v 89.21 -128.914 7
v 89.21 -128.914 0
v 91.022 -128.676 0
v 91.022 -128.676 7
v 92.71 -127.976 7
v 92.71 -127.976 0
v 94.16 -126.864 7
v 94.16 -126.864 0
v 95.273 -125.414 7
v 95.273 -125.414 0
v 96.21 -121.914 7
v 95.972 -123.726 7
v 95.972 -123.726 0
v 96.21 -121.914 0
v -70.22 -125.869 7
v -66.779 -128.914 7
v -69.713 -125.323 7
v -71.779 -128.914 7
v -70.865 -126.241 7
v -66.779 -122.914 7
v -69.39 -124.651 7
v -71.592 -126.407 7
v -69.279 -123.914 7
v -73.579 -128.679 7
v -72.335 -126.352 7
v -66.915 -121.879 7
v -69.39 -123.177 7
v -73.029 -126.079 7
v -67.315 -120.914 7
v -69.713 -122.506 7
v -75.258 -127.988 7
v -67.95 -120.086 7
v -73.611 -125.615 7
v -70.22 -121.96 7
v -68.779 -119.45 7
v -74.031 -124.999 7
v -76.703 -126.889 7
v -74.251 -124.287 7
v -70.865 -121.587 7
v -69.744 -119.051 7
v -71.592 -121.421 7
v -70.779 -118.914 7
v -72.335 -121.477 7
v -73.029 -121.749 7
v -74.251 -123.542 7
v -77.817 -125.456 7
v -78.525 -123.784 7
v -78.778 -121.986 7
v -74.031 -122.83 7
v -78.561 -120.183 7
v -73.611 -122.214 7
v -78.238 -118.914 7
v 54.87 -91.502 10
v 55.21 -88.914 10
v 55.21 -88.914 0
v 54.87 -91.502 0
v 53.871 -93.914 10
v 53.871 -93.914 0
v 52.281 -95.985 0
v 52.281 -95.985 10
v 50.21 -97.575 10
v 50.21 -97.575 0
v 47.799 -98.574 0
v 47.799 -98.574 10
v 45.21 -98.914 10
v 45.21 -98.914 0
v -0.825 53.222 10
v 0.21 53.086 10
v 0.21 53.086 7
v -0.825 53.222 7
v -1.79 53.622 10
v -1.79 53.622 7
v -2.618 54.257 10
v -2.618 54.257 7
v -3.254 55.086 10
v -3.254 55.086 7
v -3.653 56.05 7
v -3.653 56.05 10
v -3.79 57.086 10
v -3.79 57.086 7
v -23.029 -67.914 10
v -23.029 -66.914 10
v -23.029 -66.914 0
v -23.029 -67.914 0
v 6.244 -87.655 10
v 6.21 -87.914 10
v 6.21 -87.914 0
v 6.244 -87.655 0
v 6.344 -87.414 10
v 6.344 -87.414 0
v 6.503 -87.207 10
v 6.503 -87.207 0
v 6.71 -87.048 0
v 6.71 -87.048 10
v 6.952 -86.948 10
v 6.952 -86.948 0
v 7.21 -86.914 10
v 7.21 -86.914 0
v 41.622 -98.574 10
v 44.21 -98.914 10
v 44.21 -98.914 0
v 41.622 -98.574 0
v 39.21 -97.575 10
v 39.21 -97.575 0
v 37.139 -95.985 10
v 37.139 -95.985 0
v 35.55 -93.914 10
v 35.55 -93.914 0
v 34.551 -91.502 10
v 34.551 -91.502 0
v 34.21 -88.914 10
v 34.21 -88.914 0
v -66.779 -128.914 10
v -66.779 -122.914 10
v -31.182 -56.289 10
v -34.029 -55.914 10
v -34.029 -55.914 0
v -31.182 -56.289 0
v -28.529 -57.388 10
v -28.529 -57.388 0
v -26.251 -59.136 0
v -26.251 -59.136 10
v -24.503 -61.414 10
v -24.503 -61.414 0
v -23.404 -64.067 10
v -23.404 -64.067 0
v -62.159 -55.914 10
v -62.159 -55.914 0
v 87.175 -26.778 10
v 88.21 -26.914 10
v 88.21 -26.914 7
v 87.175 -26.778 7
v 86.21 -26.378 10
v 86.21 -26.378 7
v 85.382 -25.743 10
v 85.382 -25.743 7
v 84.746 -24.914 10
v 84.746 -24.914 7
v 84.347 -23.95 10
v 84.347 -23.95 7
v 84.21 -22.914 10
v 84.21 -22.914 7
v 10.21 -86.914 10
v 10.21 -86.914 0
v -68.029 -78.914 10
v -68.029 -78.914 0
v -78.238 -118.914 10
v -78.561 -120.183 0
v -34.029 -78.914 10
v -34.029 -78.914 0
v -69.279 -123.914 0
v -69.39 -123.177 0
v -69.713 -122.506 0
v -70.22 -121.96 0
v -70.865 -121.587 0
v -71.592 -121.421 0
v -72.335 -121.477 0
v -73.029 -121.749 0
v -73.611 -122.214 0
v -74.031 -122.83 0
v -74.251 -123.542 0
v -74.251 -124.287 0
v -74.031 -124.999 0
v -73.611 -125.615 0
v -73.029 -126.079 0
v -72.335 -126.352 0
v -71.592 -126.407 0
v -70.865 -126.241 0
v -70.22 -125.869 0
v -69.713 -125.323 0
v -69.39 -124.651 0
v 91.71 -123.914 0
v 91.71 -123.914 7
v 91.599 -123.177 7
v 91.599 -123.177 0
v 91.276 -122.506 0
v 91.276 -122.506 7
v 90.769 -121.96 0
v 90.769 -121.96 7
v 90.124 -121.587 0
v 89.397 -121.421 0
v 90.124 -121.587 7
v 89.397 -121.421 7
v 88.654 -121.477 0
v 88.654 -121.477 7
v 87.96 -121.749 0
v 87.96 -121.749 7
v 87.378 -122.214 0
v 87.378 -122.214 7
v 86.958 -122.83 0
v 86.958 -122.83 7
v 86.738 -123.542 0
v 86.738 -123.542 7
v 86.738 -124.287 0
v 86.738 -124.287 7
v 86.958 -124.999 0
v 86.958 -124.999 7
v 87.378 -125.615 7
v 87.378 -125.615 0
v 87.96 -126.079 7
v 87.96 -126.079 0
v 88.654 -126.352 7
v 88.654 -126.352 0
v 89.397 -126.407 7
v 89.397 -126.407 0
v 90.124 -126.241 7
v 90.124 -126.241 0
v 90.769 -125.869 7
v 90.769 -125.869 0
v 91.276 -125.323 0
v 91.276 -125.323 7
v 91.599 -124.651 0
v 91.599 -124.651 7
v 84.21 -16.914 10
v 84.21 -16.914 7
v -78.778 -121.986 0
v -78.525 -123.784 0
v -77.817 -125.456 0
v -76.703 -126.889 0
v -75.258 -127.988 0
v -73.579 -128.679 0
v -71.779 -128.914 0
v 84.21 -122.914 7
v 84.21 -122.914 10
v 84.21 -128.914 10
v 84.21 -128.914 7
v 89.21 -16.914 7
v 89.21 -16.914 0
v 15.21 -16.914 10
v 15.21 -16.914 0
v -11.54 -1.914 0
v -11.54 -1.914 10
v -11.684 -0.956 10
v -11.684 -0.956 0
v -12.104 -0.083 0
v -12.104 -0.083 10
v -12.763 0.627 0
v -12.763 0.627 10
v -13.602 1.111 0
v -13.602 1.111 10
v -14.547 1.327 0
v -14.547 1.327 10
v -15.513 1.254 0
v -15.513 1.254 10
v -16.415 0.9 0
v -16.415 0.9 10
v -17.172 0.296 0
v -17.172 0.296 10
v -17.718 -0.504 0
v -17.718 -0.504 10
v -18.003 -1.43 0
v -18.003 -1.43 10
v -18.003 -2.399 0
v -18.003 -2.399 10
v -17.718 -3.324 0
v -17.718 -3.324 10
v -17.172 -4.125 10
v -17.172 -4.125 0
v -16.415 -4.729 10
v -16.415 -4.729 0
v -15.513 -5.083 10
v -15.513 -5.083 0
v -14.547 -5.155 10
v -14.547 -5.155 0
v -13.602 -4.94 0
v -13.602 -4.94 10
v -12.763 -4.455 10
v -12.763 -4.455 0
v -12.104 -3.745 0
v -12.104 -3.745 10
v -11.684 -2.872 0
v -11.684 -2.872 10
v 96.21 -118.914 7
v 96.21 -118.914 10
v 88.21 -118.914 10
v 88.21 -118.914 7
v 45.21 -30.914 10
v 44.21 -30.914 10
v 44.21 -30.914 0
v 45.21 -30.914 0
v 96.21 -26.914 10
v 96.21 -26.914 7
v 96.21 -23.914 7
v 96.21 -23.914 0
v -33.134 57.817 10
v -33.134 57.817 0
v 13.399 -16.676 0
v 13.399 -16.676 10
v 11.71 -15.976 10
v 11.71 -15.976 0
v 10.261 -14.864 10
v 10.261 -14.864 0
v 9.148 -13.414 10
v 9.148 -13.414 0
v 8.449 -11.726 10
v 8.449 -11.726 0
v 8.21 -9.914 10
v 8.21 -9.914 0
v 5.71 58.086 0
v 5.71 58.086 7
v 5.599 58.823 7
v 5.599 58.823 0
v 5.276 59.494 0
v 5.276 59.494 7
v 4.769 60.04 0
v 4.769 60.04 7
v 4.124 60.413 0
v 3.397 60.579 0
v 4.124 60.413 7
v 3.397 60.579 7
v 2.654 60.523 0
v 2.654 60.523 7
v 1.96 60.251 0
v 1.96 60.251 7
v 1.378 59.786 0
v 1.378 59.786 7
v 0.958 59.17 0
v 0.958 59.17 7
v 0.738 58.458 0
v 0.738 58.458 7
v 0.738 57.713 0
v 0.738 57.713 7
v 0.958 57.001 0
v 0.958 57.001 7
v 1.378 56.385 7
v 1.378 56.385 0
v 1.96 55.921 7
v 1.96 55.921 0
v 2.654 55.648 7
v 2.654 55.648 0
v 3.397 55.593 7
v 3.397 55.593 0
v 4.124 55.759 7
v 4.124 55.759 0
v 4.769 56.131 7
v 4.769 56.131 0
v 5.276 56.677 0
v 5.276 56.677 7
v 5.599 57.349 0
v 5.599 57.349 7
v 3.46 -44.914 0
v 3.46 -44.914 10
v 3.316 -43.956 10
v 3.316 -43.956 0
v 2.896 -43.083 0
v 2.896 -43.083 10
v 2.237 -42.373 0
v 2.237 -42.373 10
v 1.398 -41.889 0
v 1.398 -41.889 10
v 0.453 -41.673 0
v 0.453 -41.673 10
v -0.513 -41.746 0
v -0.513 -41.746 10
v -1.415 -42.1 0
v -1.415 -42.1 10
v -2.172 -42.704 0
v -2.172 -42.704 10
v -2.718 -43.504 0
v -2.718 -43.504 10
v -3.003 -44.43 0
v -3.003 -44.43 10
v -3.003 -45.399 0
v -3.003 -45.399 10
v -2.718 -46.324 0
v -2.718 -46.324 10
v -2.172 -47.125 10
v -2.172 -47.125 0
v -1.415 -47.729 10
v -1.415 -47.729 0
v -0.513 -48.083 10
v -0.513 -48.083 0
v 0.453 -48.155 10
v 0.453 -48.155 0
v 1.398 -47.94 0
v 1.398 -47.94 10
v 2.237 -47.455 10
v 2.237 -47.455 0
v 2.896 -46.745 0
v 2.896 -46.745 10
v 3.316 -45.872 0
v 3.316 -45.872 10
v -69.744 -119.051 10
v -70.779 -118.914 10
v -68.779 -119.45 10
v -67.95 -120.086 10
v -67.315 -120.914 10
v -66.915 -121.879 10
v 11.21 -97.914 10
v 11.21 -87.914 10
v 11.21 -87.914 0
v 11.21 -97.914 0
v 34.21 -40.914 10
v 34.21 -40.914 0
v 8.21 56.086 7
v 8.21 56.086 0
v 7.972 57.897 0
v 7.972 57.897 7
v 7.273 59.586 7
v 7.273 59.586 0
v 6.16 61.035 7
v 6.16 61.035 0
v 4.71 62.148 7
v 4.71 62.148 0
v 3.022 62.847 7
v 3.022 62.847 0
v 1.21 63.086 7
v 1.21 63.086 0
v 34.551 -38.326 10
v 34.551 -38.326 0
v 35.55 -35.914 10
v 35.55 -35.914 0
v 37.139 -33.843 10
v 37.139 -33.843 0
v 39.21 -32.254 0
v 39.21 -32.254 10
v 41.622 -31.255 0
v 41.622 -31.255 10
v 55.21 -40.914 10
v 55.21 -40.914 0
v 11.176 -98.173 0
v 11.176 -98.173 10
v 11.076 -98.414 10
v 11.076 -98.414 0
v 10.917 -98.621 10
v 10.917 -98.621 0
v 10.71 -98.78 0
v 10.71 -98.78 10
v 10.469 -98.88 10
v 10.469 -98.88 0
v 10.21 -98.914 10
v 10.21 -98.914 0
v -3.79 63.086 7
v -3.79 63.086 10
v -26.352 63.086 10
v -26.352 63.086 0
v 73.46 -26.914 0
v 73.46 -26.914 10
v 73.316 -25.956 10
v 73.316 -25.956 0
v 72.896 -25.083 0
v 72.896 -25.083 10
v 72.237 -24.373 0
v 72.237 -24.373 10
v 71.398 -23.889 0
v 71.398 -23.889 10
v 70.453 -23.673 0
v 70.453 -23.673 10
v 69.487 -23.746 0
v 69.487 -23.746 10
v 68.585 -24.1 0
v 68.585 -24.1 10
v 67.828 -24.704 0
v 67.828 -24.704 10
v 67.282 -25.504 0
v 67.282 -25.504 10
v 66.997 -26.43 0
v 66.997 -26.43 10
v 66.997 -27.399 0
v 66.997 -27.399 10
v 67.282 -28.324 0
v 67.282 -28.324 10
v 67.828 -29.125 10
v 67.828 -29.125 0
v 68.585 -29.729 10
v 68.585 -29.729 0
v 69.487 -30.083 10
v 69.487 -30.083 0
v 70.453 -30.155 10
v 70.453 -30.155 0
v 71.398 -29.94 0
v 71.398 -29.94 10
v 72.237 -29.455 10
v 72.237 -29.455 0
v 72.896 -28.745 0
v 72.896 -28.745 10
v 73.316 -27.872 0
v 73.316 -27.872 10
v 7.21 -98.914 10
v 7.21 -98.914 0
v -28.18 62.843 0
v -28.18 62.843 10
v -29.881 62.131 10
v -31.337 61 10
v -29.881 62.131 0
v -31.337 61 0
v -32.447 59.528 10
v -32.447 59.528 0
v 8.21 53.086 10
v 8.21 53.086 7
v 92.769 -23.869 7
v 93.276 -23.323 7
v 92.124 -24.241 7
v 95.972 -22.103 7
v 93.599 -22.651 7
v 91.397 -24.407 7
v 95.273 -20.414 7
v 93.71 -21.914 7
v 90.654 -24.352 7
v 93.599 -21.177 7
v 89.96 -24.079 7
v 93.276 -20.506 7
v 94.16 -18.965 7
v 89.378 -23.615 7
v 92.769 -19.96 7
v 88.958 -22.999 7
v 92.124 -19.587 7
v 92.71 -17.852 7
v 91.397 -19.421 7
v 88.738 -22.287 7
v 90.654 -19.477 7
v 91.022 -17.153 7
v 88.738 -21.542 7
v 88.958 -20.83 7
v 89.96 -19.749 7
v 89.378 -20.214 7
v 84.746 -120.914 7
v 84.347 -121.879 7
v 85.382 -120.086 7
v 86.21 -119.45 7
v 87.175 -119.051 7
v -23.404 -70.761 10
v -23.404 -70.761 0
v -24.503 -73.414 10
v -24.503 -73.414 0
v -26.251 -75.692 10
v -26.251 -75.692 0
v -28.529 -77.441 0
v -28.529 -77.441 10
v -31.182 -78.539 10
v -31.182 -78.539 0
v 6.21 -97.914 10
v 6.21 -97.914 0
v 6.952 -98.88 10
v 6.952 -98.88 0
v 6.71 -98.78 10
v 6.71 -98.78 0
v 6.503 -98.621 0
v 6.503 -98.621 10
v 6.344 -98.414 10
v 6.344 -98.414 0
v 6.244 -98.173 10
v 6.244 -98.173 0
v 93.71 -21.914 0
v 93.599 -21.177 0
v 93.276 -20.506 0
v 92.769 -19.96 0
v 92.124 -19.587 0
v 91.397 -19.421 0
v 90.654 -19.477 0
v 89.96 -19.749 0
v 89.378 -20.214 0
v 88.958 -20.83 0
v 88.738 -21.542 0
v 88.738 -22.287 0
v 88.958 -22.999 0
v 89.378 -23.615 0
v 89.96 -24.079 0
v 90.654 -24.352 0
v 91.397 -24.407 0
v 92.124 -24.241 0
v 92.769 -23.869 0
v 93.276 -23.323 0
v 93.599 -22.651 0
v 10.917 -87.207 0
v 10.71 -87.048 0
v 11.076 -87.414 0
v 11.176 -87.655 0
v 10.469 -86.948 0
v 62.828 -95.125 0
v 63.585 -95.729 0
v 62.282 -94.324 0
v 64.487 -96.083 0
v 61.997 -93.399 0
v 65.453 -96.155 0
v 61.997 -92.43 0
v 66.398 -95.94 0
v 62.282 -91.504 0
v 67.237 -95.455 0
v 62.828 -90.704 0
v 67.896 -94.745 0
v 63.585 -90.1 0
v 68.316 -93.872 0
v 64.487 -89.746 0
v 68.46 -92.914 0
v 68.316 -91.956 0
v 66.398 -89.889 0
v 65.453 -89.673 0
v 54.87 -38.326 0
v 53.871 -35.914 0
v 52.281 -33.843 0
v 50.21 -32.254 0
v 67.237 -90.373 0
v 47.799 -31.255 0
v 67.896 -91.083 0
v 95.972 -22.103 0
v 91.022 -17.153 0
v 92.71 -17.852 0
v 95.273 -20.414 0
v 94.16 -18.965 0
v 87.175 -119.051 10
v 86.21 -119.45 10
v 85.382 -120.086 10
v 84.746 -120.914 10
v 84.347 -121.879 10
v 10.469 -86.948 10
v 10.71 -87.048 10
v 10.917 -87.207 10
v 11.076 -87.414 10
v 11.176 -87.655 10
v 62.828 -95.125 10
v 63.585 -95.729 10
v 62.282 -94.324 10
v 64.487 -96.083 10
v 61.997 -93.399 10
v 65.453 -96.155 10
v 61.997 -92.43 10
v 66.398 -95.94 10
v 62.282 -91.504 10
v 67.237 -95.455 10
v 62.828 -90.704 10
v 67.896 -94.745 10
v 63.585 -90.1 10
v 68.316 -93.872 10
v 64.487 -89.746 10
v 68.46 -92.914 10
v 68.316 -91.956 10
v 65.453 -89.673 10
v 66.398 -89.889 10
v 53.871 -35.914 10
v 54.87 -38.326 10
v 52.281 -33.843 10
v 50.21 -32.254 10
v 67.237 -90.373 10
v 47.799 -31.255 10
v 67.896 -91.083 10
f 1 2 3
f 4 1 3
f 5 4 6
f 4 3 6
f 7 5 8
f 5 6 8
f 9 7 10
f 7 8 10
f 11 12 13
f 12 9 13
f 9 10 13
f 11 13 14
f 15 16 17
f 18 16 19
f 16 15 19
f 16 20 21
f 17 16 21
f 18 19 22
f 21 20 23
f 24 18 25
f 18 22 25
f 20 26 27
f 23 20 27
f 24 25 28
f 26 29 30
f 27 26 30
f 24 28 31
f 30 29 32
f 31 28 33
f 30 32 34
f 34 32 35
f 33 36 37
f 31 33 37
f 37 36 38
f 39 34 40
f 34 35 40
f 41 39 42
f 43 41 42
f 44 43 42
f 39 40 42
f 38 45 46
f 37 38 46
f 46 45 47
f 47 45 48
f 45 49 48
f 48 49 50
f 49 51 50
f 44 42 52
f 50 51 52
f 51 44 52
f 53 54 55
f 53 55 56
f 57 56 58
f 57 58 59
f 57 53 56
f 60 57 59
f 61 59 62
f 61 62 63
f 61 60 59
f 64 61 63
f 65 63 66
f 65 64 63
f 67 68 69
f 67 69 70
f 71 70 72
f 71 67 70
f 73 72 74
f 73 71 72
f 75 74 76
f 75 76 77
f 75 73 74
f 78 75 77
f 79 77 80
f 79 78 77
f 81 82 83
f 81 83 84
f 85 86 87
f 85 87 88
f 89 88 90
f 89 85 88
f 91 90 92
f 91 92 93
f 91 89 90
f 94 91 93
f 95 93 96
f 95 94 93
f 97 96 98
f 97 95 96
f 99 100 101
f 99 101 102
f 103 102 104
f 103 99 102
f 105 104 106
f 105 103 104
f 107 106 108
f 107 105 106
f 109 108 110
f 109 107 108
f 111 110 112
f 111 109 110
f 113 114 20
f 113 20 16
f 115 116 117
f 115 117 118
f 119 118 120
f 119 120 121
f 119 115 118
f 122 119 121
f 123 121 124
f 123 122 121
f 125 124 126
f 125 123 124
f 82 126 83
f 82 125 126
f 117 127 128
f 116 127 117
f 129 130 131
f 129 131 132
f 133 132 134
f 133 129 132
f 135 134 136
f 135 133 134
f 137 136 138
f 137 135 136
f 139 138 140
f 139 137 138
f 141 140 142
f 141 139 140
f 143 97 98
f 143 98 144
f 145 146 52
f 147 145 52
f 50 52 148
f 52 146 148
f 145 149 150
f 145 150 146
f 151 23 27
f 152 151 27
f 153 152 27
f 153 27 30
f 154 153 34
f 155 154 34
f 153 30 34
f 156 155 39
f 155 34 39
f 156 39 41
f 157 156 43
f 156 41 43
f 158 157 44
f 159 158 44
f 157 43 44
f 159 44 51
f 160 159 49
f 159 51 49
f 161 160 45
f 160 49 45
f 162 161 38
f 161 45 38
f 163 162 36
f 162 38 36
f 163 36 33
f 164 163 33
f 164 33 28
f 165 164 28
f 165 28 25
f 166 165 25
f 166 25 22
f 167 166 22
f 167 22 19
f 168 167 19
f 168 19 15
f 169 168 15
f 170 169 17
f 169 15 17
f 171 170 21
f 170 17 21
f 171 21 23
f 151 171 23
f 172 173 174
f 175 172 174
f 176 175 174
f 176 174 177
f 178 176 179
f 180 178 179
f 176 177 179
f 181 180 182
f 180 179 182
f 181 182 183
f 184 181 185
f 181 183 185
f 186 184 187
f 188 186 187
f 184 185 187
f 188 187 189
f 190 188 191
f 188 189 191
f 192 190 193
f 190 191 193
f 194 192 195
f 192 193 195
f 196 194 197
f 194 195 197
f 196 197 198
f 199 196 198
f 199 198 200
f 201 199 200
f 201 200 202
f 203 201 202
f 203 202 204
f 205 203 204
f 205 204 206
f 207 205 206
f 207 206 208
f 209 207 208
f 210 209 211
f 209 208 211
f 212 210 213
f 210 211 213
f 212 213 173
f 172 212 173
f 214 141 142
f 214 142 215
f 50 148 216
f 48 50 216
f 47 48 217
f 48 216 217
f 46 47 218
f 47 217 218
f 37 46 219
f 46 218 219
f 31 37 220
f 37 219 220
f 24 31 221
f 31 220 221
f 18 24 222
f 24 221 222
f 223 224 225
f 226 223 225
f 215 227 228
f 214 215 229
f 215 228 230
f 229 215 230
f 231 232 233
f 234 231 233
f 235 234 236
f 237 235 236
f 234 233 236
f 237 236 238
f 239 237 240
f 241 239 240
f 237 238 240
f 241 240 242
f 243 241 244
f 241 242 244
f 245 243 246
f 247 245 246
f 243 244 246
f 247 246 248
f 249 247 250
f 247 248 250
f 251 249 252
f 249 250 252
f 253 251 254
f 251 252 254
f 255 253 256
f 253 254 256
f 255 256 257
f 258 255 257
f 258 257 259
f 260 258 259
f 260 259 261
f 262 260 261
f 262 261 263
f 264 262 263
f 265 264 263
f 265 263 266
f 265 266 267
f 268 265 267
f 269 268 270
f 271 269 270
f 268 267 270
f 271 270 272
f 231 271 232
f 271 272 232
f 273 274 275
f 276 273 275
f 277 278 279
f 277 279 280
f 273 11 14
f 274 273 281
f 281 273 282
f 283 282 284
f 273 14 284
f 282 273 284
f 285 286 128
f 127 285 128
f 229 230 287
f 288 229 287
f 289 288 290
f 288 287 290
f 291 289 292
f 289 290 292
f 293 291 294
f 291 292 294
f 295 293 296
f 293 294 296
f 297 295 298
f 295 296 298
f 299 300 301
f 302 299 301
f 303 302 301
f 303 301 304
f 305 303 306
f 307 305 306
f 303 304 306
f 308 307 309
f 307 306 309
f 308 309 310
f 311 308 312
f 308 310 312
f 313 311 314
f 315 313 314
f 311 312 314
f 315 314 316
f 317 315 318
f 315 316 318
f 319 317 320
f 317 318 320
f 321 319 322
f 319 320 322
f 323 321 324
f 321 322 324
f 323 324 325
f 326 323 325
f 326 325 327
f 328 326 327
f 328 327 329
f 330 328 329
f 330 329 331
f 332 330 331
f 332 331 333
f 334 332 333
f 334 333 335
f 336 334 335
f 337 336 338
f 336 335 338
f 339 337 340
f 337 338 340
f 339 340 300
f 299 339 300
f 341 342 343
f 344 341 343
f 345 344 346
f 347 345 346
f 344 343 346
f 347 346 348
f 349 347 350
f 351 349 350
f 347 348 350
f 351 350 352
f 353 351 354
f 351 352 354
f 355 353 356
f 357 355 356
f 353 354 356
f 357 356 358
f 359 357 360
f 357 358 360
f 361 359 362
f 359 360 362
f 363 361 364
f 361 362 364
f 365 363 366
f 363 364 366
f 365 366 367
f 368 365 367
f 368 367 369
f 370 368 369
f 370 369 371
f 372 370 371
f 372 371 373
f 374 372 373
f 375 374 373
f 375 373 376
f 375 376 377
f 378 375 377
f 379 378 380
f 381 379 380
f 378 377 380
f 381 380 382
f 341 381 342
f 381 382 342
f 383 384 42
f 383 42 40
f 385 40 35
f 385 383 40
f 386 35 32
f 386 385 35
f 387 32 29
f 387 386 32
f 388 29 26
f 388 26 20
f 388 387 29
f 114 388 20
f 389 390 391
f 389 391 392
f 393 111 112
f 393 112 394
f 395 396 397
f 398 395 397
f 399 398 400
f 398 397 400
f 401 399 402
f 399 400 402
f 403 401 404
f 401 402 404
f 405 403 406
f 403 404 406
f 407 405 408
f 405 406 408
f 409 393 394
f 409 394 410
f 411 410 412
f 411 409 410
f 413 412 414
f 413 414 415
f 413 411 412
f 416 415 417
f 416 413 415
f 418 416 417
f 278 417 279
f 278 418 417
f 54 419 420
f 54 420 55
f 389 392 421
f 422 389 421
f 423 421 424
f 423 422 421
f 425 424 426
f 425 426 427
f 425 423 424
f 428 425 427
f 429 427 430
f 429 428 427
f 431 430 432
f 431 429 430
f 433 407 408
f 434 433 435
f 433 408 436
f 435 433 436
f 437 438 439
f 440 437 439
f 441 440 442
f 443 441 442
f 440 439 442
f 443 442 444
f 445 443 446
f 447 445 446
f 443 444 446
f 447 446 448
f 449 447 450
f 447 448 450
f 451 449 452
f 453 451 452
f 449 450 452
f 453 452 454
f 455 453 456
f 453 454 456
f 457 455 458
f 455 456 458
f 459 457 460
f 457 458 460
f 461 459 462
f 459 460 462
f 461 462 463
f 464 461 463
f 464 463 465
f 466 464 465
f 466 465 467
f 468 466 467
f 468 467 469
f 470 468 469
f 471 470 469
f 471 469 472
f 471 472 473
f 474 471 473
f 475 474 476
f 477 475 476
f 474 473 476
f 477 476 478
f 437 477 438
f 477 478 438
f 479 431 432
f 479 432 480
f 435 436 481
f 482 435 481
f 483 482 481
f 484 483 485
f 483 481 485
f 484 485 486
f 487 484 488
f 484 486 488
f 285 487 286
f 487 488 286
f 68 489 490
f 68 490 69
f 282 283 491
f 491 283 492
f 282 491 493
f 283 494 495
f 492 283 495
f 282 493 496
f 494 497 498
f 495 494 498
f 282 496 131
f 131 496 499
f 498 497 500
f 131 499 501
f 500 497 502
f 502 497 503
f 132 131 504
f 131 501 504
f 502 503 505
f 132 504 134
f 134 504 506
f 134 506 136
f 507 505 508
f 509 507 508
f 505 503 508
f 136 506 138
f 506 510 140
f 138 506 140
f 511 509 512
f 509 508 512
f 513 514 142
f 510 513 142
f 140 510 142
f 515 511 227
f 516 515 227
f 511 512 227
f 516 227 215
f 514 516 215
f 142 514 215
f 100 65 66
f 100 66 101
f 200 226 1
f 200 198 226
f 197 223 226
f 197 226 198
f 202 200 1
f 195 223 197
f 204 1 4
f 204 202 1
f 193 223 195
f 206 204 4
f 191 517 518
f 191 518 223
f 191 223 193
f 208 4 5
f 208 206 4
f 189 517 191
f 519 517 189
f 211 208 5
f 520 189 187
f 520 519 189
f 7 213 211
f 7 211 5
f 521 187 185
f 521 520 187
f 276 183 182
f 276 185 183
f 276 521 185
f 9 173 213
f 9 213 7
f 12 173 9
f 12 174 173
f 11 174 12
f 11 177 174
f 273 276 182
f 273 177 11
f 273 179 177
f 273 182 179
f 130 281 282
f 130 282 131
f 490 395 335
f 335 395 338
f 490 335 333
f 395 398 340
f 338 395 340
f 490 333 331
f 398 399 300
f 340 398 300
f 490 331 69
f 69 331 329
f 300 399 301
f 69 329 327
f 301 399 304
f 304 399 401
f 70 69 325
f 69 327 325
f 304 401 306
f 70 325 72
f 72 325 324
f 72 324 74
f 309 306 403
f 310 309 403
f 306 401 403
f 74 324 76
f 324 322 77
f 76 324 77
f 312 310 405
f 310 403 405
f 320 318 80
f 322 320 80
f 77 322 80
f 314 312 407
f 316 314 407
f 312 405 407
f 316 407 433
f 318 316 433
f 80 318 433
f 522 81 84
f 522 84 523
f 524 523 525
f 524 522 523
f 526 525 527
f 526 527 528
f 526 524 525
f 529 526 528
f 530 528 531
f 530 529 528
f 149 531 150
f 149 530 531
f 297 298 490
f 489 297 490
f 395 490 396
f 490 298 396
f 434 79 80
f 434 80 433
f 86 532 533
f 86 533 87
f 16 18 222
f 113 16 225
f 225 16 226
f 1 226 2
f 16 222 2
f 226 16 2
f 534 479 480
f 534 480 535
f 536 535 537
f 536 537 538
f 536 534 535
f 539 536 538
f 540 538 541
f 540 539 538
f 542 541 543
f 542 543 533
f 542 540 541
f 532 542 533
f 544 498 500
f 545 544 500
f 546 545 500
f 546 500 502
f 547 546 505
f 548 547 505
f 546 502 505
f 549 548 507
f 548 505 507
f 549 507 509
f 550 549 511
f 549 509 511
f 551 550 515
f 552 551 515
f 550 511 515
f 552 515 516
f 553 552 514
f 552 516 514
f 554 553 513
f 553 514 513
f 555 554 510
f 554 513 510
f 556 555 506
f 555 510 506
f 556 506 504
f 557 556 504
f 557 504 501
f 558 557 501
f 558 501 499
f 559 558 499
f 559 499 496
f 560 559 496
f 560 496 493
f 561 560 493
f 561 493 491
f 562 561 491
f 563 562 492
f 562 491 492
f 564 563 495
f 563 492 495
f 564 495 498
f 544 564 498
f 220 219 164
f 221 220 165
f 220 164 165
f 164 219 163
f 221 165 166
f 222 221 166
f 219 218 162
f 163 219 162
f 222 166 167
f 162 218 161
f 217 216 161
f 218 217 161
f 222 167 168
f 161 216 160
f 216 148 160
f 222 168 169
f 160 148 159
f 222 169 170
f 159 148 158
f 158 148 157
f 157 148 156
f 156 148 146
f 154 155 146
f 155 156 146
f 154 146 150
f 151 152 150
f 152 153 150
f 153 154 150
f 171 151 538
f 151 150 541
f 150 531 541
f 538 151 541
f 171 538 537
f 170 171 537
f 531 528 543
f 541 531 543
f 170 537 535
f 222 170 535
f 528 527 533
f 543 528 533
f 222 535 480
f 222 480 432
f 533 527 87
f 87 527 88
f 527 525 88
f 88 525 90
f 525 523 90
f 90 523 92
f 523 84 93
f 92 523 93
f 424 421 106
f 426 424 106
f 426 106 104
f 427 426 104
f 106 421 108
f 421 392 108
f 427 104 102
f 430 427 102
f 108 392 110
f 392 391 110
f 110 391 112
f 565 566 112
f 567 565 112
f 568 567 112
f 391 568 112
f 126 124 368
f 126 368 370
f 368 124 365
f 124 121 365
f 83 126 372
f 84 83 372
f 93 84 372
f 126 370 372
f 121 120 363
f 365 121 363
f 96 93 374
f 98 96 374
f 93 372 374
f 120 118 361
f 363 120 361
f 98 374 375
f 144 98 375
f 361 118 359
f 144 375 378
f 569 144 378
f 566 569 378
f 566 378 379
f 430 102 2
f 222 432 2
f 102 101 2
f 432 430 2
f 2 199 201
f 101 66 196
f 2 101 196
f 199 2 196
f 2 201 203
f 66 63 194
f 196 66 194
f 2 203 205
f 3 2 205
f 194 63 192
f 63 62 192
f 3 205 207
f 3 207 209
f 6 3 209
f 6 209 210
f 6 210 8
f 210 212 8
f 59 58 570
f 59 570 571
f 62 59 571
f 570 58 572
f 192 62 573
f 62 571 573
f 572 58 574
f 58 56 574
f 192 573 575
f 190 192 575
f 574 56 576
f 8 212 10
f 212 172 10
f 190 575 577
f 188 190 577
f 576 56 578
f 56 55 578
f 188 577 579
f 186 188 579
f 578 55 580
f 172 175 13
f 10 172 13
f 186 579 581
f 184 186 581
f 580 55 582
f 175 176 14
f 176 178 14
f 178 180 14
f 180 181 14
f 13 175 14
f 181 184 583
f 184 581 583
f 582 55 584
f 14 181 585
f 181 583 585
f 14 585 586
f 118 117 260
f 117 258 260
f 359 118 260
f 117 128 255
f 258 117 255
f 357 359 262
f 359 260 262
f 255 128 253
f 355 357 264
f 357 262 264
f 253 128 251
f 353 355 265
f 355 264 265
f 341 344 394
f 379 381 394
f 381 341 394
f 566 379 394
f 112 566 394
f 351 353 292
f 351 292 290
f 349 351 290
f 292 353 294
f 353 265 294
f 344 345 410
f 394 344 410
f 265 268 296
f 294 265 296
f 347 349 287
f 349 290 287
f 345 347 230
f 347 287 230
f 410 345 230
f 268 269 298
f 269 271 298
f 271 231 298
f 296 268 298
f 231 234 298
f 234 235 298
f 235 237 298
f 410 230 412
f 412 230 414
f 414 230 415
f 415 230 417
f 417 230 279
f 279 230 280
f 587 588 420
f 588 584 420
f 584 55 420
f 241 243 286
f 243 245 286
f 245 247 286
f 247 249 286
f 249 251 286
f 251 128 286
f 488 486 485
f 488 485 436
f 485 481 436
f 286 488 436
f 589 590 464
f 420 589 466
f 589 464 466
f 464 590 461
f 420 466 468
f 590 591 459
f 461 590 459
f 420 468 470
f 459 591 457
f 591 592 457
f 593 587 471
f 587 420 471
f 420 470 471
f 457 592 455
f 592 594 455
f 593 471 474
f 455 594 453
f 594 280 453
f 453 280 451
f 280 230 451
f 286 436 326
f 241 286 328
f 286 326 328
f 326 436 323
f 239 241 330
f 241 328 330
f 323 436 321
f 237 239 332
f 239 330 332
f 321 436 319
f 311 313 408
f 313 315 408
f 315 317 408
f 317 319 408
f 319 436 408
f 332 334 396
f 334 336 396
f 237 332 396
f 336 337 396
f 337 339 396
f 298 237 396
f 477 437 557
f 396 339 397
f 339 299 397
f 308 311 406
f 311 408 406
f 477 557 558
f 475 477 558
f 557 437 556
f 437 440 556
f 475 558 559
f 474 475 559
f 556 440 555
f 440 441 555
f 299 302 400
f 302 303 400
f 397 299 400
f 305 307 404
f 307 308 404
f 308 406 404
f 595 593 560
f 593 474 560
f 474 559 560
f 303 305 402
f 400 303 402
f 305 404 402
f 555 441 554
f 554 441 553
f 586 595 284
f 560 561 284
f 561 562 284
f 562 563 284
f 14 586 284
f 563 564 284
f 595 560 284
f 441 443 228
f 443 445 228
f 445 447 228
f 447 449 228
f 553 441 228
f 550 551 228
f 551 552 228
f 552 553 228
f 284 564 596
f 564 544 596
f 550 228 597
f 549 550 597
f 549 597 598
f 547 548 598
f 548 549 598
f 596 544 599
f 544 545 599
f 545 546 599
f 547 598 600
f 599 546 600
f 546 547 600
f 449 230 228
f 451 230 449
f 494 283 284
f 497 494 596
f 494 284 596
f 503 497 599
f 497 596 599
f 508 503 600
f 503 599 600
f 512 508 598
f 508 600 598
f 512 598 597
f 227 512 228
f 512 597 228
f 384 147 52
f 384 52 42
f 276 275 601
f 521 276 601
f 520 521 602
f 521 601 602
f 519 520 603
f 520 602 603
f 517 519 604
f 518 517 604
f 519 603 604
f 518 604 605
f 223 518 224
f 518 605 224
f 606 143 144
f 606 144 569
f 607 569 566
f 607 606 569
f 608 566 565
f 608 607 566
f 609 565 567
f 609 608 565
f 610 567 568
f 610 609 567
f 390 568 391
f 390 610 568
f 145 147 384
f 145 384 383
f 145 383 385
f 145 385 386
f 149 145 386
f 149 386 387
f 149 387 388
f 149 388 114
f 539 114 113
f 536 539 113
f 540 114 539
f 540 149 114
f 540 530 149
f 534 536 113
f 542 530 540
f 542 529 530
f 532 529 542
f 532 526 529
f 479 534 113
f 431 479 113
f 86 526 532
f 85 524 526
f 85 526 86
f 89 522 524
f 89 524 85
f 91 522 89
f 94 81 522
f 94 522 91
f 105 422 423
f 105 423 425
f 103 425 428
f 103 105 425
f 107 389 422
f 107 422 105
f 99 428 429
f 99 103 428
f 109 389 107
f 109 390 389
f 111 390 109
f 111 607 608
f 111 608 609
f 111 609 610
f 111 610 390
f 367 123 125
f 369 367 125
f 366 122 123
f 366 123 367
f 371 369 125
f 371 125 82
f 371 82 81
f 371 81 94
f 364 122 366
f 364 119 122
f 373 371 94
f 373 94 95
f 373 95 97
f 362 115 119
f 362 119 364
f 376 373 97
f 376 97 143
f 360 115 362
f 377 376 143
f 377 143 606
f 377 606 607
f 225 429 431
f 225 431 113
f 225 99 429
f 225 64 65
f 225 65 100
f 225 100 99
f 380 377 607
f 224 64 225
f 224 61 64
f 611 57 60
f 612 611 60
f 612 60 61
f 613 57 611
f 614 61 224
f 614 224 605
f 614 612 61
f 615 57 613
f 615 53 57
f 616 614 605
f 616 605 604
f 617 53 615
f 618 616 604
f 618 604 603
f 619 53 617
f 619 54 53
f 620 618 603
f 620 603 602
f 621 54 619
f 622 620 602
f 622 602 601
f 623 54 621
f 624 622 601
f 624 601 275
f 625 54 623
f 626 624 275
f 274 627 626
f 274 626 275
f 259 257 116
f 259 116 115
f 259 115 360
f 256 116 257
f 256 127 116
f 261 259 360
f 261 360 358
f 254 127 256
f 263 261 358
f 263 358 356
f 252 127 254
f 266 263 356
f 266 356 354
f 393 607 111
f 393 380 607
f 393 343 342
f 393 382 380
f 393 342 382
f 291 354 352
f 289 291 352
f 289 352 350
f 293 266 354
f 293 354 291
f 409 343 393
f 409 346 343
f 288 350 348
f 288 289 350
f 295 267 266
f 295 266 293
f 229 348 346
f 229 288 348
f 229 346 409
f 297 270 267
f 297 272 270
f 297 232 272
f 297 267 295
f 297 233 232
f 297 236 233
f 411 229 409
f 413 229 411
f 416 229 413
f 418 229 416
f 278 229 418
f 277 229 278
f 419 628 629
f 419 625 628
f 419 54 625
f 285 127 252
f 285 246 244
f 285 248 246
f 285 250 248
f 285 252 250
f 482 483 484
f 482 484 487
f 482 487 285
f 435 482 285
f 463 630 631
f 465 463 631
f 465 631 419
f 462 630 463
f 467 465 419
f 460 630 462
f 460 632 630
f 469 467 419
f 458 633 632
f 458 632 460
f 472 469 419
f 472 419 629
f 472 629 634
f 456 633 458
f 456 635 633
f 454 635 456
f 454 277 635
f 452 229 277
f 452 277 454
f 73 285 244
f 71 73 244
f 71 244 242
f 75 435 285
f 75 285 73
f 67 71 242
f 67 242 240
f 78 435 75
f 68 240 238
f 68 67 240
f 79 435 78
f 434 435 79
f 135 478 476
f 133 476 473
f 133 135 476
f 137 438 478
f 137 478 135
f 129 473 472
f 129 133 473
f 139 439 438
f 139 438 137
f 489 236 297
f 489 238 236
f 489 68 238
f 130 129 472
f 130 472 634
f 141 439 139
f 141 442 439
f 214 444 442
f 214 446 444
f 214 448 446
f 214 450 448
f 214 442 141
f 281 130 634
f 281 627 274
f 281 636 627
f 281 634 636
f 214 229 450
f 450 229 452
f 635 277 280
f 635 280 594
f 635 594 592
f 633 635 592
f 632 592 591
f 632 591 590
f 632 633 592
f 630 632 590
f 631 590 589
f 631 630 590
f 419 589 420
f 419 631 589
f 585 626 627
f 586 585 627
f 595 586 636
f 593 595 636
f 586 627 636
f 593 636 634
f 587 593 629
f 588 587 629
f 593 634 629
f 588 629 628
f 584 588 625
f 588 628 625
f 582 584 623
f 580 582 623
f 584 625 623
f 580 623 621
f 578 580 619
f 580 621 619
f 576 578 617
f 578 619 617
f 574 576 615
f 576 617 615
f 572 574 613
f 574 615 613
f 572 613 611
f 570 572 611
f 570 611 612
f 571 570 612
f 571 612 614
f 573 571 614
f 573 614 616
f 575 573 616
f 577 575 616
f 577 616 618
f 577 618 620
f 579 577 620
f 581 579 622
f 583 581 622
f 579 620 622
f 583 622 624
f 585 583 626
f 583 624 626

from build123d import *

# Parameters (mm, degrees)
BOSS_EXTRUDE1_DEPTH = 10
CUT_EXTRUDE1_DEPTH  = 10
SKETCH3_R           = 3.25
CUT_EXTRUDE2_DEPTH  = 10
CUT_EXTRUDE3_DEPTH  = 3
SKETCH5_R           = 2.5
CUT_EXTRUDE4_DEPTH  = 7


with BuildPart() as part:
    # Sketch1 → Boss-Extrude1 (new body)
    with BuildSketch(Plane.XY):
        with BuildLine():
            Line((89.21038961, -16.914285714), (15.21038961, -16.914285714))
            ThreePointArc((15.21038961, -16.914285714), (10.260642142, -14.864033183), (8.21038961, -9.914285714))
            Line((8.21038961, -9.914285714), (8.21038961, 56.085714286))
            ThreePointArc((8.21038961, 56.085714286), (6.160137079, 61.035461754), (1.21038961, 63.085714286))
            Line((1.21038961, 63.085714286), (-26.351704849, 63.085714286))
            ThreePointArc((-26.351704849, 63.085714286), (-30.646070949, 61.613681345), (-33.134308946, 57.816691373))
            Line((-33.134308946, 57.816691373), (-78.561392279, -120.183308627))
            ThreePointArc((-78.561392279, -120.183308627), (-77.306755242, -126.208651814), (-71.778788183, -128.914285714))
            Line((-71.778788183, -128.914285714), (89.21038961, -128.914285714))
            ThreePointArc((89.21038961, -128.914285714), (94.160137079, -126.864033183), (96.21038961, -121.914285714))
            Line((96.21038961, -121.914285714), (96.21038961, -23.914285714))
            ThreePointArc((96.21038961, -23.914285714), (94.160137079, -18.964538246), (89.21038961, -16.914285714))
        make_face()
    extrude(amount=BOSS_EXTRUDE1_DEPTH)

    # Sketch2 → Cut-Extrude1 (cut)
    with BuildSketch(Plane.XY.offset(10)):
        with BuildLine():
            Line((-68.029193723, -55.914285714), (-34.029193723, -55.914285714))
            ThreePointArc((-34.029193723, -55.914285714), (-26.25101913, -59.136111121), (-23.029193723, -66.914285714))
            Line((-23.029193723, -66.914285714), (-23.029193723, -67.914285714))
            ThreePointArc((-23.029193723, -67.914285714), (-26.25101913, -75.692460307), (-34.029193723, -78.914285714))
            Line((-34.029193723, -78.914285714), (-68.029193723, -78.914285714))
            Line((-68.029193723, -78.914285714), (-68.029193723, -55.914285714))
        make_face()
    extrude(amount=-CUT_EXTRUDE1_DEPTH, mode=Mode.SUBTRACT)

    # Sketch3 → Cut-Extrude2 (cut)
    with BuildSketch(Plane.XY.offset(10)):
        with Locations((-14.78961039, -1.914285714)):
            Circle(SKETCH3_R)
        with Locations((0.21038961, -44.914285714)):
            Circle(SKETCH3_R)
        with Locations((70.21038961, -26.914285714)):
            Circle(SKETCH3_R)
        with Locations((65.21038961, -92.914285714)):
            Circle(SKETCH3_R)
        with BuildLine():
            Line((7.21038961, -86.914285714), (10.21038961, -86.914285714))
            ThreePointArc((10.21038961, -86.914285714), (10.917496392, -87.207178933), (11.21038961, -87.914285714))
            Line((11.21038961, -87.914285714), (11.21038961, -97.914285714))
            ThreePointArc((11.21038961, -97.914285714), (10.917496392, -98.621392495), (10.21038961, -98.914285714))
            Line((10.21038961, -98.914285714), (7.21038961, -98.914285714))
            ThreePointArc((7.21038961, -98.914285714), (6.503282829, -98.621392495), (6.21038961, -97.914285714))
            Line((6.21038961, -97.914285714), (6.21038961, -87.914285714))
            ThreePointArc((6.21038961, -87.914285714), (6.503282829, -87.207178933), (7.21038961, -86.914285714))
        make_face()
        with BuildLine():
            Line((44.21038961, -30.914285714), (45.21038961, -30.914285714))
            ThreePointArc((45.21038961, -30.914285714), (52.281457422, -33.843217902), (55.21038961, -40.914285714))
            Line((55.21038961, -40.914285714), (55.21038961, -88.914285714))
            ThreePointArc((55.21038961, -88.914285714), (52.281457422, -95.985353526), (45.21038961, -98.914285714))
            Line((45.21038961, -98.914285714), (44.21038961, -98.914285714))
            ThreePointArc((44.21038961, -98.914285714), (37.139321799, -95.985353526), (34.21038961, -88.914285714))
            Line((34.21038961, -88.914285714), (34.21038961, -40.914285714))
            ThreePointArc((34.21038961, -40.914285714), (37.139321799, -33.843217902), (44.21038961, -30.914285714))
        make_face()
    extrude(amount=-CUT_EXTRUDE2_DEPTH, mode=Mode.SUBTRACT)

    # Sketch4 → Cut-Extrude3 (cut)
    with BuildSketch(Plane.XY.offset(10)):
        with BuildLine():
            Line((96.21038961, -118.914285714), (88.21038961, -118.914285714))
            ThreePointArc((88.21038961, -118.914285714), (85.381962486, -120.08585859), (84.21038961, -122.914285714))
            Line((84.21038961, -122.914285714), (84.21038961, -128.914285714))
            Line((84.21038961, -128.914285714), (96.21038961, -128.914285714))
            Line((96.21038961, -128.914285714), (96.21038961, -118.914285714))
        make_face()
        with BuildLine():
            Line((-66.778788183, -128.914285714), (-78.778788183, -128.914285714))
            Line((-78.778788183, -128.914285714), (-78.778788183, -118.914285714))
            Line((-78.778788183, -118.914285714), (-70.778788183, -118.914285714))
            ThreePointArc((-70.778788183, -118.914285714), (-67.950361058, -120.08585859), (-66.778788183, -122.914285714))
            Line((-66.778788183, -122.914285714), (-66.778788183, -128.914285714))
        make_face()
        with BuildLine():
            Line((84.21038961, -16.914285714), (96.21038961, -16.914285714))
            Line((96.21038961, -16.914285714), (96.21038961, -26.914285714))
            Line((96.21038961, -26.914285714), (88.21038961, -26.914285714))
            ThreePointArc((88.21038961, -26.914285714), (85.381962486, -25.742712839), (84.21038961, -22.914285714))
            Line((84.21038961, -22.914285714), (84.21038961, -16.914285714))
        make_face()
        with BuildLine():
            Line((-3.78961039, 63.085714286), (8.21038961, 63.085714286))
            Line((8.21038961, 63.085714286), (8.21038961, 53.085714286))
            Line((8.21038961, 53.085714286), (0.21038961, 53.085714286))
            ThreePointArc((0.21038961, 53.085714286), (-2.618037514, 54.257287161), (-3.78961039, 57.085714286))
            Line((-3.78961039, 57.085714286), (-3.78961039, 63.085714286))
        make_face()
    extrude(amount=-CUT_EXTRUDE3_DEPTH, mode=Mode.SUBTRACT)

    # Sketch5 → Cut-Extrude4 (cut)
    with BuildSketch(Plane.XY.offset(7)):
        with Locations((-71.778788183, -123.914285714)):
            Circle(SKETCH5_R)
        with Locations((89.21038961, -123.914285714)):
            Circle(SKETCH5_R)
        with Locations((91.21038961, -21.914285714)):
            Circle(SKETCH5_R)
        with Locations((3.21038961, 58.085714286)):
            Circle(SKETCH5_R)
    extrude(amount=-CUT_EXTRUDE4_DEPTH, mode=Mode.SUBTRACT)


solid = part.part
